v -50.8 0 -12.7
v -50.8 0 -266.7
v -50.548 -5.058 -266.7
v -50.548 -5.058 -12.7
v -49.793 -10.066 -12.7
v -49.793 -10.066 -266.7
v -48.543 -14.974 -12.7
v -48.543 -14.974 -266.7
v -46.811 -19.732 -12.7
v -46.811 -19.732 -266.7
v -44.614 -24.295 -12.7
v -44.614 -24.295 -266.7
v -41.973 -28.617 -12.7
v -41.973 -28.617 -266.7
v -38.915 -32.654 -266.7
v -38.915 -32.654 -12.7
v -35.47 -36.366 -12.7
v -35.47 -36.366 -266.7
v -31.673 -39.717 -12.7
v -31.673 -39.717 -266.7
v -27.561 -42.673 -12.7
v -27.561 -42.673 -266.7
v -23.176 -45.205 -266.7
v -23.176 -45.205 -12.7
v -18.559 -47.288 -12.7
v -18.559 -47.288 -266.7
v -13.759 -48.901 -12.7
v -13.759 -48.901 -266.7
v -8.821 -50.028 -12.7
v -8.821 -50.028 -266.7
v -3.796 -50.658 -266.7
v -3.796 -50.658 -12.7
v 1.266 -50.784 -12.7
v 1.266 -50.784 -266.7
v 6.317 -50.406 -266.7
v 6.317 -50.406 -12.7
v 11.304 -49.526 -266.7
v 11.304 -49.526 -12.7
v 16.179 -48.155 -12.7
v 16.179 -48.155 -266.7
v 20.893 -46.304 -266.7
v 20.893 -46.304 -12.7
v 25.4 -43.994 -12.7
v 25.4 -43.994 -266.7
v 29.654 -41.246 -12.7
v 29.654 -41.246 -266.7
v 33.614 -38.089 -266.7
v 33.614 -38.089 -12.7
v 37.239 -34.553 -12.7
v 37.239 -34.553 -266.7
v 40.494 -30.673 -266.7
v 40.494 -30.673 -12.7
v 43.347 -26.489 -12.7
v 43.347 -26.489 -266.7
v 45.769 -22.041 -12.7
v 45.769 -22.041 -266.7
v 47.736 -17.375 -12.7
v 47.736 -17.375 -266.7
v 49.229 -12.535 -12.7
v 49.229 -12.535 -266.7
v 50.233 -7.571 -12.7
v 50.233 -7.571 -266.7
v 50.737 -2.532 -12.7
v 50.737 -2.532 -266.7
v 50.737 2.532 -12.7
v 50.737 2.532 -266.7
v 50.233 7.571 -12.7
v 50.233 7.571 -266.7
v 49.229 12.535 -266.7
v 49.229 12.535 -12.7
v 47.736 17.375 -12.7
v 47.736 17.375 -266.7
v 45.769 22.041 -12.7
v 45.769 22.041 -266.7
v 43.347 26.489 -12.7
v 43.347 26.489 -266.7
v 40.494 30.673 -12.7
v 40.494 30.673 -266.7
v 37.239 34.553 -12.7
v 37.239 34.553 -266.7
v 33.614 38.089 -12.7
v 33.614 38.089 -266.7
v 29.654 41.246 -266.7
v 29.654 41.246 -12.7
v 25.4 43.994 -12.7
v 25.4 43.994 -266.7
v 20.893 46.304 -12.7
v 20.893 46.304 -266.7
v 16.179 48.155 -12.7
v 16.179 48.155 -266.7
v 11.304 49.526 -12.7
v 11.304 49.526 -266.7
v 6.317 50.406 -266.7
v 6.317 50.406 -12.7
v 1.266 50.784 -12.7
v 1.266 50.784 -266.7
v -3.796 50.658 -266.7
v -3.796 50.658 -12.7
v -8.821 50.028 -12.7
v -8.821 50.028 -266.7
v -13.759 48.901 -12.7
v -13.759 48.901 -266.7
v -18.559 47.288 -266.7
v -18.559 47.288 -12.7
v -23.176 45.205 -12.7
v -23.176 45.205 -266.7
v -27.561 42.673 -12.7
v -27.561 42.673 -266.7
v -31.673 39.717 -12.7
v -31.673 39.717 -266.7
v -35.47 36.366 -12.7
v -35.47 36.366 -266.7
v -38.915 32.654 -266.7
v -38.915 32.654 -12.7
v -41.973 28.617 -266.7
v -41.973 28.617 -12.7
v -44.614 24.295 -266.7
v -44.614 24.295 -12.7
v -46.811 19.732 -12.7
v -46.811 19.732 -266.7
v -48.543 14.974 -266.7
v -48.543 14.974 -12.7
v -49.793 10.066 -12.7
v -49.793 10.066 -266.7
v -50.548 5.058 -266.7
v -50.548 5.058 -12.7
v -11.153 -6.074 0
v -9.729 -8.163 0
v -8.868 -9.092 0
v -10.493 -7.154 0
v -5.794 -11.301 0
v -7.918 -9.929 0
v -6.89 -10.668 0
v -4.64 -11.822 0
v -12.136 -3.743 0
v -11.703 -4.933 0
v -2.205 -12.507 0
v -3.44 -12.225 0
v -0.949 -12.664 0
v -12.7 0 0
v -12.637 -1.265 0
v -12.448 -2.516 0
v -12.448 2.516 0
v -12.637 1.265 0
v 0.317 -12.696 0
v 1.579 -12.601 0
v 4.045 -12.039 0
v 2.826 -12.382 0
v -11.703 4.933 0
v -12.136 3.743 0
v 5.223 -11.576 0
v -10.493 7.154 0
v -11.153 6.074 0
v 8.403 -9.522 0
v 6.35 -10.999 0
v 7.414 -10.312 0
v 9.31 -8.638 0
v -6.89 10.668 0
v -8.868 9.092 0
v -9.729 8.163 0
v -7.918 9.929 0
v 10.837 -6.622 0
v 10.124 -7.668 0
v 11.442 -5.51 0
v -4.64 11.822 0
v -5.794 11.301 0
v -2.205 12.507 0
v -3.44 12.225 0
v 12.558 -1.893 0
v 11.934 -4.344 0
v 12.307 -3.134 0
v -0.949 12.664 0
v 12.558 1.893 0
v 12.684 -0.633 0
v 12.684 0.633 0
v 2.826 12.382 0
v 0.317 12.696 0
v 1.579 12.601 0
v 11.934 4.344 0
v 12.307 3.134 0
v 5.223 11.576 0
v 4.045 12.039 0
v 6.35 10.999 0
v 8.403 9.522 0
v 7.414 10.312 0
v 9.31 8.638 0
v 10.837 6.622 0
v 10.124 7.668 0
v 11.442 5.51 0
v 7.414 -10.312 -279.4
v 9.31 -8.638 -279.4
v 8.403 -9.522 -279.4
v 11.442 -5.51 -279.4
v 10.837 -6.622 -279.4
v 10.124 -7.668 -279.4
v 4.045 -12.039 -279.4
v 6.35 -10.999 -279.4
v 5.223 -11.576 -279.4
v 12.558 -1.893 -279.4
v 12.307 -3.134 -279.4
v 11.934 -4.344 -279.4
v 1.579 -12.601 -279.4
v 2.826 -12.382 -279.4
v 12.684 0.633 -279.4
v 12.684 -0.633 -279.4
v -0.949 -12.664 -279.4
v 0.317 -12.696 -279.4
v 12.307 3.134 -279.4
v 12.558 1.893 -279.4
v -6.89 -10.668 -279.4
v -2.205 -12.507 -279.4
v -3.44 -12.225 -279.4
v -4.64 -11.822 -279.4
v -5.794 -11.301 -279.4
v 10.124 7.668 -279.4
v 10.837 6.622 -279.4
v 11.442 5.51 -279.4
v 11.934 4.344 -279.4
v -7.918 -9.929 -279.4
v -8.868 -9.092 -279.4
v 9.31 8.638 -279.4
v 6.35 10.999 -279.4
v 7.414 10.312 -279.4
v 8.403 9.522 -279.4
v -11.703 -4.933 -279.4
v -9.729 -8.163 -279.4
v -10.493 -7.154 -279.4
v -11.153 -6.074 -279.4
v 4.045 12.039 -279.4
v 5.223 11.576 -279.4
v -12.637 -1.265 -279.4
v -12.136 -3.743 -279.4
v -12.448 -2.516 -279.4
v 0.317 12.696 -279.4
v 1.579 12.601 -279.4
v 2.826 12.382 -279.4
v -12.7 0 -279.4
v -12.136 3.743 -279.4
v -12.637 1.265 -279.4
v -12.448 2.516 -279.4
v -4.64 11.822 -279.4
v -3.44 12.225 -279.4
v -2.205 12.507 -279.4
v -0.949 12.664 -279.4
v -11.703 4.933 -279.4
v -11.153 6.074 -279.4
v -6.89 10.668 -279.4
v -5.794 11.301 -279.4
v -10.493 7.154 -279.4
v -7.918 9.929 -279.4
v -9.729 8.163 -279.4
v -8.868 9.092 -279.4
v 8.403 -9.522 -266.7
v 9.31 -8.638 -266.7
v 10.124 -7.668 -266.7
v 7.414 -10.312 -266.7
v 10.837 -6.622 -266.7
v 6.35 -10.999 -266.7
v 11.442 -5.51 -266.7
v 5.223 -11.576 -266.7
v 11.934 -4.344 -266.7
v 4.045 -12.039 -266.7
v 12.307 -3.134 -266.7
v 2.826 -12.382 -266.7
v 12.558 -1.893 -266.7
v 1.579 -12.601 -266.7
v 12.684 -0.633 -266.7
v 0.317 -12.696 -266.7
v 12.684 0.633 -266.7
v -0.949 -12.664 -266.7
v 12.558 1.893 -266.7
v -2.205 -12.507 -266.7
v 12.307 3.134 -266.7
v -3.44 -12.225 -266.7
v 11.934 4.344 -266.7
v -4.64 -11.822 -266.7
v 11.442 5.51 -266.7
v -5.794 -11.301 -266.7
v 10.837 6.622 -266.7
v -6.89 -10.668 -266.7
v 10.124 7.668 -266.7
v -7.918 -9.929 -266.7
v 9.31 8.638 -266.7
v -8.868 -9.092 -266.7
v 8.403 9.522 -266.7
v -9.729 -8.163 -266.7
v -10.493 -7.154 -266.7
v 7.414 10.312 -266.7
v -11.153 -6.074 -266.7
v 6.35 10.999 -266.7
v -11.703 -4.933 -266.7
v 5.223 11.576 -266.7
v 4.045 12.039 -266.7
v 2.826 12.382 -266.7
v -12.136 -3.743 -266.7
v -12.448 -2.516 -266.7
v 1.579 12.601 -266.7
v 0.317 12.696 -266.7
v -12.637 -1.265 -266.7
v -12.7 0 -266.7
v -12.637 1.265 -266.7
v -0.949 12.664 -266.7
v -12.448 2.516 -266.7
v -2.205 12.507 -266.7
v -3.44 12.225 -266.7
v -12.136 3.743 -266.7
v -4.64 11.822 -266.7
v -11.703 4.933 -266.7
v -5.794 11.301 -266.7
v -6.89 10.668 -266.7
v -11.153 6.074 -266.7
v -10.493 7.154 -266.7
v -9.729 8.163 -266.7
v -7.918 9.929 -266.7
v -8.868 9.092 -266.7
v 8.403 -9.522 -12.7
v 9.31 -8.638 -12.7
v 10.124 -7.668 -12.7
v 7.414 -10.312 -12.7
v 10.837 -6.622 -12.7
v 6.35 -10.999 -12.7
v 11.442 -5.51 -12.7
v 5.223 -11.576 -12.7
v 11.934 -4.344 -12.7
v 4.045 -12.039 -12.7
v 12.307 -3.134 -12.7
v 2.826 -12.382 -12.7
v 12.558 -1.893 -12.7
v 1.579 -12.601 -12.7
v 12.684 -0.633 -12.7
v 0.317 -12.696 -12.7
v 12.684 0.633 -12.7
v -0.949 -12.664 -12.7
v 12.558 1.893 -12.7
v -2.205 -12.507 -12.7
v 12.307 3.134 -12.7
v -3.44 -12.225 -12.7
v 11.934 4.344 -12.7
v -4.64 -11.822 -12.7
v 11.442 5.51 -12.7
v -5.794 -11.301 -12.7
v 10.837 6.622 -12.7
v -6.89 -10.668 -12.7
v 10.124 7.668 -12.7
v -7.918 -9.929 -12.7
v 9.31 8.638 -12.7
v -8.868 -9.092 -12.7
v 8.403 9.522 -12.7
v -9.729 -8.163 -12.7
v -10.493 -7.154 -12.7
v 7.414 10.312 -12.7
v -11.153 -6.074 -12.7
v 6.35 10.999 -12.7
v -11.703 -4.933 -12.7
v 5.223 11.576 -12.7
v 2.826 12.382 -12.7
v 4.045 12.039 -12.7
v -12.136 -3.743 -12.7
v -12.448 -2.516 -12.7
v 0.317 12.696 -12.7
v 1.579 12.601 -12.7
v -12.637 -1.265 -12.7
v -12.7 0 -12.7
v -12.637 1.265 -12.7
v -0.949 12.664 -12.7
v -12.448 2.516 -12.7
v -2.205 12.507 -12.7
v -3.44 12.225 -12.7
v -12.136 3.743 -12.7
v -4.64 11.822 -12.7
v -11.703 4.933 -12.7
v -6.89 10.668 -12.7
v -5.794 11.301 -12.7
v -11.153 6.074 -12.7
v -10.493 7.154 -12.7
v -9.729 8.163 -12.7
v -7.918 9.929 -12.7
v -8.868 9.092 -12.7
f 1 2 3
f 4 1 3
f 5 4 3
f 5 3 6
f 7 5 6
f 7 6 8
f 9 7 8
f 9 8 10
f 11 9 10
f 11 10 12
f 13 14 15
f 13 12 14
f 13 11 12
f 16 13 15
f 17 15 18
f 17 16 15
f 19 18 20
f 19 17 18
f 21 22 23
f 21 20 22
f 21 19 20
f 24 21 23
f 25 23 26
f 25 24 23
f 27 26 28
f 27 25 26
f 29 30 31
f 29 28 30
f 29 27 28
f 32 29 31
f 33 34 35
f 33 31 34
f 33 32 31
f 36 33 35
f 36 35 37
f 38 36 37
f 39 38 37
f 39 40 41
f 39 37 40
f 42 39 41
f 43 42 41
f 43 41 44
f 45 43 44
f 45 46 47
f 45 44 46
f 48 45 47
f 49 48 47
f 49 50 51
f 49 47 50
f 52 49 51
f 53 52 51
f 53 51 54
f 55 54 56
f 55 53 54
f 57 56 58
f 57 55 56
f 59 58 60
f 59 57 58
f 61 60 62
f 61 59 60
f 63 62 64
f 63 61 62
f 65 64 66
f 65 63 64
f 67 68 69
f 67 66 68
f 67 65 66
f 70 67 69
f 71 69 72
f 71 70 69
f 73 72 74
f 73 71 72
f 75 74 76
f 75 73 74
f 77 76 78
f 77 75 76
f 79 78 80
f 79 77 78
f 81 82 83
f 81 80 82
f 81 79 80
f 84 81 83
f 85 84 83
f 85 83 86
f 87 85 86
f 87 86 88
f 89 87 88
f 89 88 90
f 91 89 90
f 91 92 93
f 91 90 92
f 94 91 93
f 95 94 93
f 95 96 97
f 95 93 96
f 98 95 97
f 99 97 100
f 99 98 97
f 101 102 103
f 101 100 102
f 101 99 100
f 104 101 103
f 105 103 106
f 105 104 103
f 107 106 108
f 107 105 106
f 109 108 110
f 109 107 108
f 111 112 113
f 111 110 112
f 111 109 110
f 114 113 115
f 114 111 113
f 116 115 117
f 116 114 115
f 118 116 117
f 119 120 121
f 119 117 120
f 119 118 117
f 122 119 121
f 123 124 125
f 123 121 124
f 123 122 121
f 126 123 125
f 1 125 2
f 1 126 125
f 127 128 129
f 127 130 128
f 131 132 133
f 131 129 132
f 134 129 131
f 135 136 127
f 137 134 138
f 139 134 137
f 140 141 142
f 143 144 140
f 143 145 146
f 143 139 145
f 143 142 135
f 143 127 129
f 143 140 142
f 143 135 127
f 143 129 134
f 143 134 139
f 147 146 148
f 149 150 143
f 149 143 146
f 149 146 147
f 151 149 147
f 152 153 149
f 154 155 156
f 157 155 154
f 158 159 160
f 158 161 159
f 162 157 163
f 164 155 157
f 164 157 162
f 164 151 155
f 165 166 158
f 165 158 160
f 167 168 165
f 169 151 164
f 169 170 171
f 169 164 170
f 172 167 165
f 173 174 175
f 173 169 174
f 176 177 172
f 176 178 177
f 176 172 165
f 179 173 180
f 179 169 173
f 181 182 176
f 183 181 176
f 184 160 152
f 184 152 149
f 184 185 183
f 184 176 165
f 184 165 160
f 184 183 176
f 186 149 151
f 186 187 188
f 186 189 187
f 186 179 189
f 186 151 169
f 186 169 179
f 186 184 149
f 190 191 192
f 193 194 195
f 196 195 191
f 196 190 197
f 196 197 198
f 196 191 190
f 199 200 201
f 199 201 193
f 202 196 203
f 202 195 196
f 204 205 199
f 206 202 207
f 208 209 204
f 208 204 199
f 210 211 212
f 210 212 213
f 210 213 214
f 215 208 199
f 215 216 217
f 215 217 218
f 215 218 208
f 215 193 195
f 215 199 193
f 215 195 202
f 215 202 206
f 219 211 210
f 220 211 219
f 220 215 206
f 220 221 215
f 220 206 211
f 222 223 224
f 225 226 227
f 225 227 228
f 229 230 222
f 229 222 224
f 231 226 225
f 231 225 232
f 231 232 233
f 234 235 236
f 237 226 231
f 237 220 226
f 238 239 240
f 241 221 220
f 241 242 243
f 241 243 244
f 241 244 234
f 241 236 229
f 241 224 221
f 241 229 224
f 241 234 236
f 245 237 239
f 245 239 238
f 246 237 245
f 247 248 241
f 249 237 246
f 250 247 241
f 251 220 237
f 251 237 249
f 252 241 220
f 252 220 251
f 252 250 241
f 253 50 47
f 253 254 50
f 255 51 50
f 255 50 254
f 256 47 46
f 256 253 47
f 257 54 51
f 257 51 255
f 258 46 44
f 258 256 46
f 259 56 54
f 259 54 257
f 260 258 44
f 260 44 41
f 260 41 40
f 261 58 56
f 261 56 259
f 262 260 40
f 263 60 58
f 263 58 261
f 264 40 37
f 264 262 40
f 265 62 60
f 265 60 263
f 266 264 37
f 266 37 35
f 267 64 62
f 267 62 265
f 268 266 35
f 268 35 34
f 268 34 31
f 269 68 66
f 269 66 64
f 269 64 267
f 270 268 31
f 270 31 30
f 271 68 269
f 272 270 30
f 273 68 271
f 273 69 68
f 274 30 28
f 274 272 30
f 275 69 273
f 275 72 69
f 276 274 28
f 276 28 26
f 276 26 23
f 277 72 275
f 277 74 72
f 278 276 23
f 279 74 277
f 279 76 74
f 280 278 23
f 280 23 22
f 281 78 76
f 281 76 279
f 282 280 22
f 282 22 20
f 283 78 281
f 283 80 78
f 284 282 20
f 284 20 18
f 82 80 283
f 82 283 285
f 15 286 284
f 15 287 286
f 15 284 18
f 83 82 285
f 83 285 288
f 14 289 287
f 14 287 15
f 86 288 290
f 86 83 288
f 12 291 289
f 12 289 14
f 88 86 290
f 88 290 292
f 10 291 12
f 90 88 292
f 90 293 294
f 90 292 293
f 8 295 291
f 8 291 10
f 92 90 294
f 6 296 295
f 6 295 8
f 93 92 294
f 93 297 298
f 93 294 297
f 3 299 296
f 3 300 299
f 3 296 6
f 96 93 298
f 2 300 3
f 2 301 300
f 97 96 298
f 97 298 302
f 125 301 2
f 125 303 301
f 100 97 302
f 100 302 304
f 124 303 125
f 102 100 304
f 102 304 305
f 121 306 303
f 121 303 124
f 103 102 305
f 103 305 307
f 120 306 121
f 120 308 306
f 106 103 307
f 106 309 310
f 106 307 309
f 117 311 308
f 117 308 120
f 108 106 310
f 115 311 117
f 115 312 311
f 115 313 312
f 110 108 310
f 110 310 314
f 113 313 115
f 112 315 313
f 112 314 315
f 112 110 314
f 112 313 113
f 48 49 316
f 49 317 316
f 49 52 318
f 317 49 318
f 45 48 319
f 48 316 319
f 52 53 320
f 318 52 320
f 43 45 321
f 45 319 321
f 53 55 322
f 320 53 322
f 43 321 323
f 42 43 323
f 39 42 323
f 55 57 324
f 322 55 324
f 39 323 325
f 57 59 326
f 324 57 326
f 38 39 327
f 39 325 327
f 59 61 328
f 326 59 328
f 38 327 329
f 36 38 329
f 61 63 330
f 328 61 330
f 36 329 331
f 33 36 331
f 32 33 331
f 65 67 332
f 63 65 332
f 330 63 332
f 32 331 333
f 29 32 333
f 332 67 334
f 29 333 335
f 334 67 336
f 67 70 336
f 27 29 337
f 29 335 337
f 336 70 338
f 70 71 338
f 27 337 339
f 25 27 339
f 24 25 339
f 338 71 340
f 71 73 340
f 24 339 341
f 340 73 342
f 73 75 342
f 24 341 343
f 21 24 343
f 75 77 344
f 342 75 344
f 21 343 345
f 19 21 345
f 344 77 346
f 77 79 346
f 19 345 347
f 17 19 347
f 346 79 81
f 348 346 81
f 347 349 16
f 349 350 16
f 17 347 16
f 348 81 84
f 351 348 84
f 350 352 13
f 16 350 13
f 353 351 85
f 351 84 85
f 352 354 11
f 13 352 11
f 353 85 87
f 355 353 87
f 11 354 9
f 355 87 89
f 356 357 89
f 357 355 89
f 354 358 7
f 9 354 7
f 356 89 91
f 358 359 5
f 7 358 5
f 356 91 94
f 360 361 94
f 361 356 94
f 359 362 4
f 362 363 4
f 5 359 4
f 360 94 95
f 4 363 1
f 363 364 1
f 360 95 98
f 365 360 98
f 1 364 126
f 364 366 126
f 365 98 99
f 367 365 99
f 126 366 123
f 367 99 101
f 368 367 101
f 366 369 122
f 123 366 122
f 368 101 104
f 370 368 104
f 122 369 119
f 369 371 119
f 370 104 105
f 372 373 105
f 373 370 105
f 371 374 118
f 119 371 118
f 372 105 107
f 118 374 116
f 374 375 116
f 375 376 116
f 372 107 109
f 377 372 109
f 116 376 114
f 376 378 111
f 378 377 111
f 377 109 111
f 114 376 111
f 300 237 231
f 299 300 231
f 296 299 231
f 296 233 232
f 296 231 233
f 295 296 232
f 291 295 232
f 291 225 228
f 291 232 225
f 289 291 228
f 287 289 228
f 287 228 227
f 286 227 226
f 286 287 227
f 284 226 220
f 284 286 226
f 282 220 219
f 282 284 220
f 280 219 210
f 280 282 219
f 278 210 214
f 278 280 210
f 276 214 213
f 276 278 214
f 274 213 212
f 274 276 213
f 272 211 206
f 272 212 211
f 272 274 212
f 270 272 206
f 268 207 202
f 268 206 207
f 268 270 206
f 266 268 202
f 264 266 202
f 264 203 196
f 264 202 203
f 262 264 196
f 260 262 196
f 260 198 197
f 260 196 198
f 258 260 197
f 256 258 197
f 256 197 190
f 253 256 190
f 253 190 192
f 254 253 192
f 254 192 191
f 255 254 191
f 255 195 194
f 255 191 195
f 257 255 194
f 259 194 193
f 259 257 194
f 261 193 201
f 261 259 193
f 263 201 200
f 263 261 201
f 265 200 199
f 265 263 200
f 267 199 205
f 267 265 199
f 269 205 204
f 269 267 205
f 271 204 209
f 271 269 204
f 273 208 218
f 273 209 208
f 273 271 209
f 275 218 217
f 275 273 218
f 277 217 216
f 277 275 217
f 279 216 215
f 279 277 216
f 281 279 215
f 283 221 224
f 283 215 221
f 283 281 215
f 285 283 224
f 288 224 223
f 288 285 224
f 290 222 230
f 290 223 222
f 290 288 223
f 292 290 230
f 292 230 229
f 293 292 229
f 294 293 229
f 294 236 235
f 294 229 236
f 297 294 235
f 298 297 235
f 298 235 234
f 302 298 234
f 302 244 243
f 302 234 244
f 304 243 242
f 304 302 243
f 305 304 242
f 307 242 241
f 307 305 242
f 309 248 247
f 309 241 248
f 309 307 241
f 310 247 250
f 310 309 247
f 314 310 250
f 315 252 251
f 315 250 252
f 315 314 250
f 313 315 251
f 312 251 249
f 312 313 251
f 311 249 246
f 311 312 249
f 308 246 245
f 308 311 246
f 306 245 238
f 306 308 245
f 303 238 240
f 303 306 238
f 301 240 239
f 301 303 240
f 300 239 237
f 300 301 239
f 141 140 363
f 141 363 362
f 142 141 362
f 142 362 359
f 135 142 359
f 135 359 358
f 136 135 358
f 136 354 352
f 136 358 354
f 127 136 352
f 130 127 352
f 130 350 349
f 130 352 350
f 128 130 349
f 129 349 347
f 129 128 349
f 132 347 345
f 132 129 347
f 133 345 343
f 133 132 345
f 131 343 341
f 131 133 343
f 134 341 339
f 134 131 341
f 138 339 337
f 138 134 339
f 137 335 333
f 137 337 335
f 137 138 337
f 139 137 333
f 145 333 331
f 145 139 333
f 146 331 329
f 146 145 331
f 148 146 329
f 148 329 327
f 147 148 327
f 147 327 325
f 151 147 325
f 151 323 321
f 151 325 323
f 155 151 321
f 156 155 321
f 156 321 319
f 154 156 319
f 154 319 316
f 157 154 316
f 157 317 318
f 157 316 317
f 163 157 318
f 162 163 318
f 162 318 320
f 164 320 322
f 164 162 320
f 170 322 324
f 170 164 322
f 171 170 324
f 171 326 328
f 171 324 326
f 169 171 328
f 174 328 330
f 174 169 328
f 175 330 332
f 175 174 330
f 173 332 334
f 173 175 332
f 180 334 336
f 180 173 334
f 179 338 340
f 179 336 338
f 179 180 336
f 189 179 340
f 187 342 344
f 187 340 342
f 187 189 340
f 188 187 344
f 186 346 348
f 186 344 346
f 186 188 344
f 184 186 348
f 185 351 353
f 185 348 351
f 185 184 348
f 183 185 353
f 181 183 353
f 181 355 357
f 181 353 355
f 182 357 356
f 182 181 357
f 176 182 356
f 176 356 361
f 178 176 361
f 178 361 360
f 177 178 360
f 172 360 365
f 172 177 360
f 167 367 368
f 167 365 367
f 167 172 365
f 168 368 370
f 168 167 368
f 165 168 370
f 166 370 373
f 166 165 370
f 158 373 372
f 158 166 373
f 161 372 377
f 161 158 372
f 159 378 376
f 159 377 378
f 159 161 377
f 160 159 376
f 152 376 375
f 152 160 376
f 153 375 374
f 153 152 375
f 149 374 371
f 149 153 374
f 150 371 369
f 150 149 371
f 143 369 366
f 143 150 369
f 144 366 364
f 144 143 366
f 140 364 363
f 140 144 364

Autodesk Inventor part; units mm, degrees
ref_plane "YZ Plane" through (0, 0, 0) normal (1, 0, 0) x (0, 1, 0)
ref_plane "XZ Plane" through (0, 0, 0) normal (0, 1, 0) x (-1, 0, 0)
ref_plane "XY Plane" through (0, 0, 0) normal (0, 0, 1) x (1, 0, 0)
sketch "Sketch1" plane through (0, 0, 0) normal (0, 0, 1) x (1, 0, 0)
  circle A0 centre (0, 0) radius 31.75
  dimension "d0" = 63.5
extrude "Extrusion1" add sketch "Sketch1" along normal blind 82.55
sketch "Sketch2" plane through (0, 0, 82.55) normal (0, 0, 1) x (1, 0, 0)
  circle A0 centre (0, 0) radius 31.75 projected
  circle A1 centre (0, 0) radius 14.859
  dimension "d3" = 29.718
extrude "Extrusion2" add sketch "Sketch2" along normal blind 6.35 contours A1
sketch "Sketch3" plane through (0, 0, 0) normal (0, 0, -1) x (-1, 0, 0)
  circle A0 centre (0, 0) radius 31.75 projected
  circle A1 centre (0, 0) radius 12.7
  dimension "d6" = 25.4
extrude "Extrusion3" add sketch "Sketch3" along normal blind 12.7 contours A1
sketch "Sketch4" plane through (0, 0, -12.7) normal (0, 0, -1) x (-1, 0, 0)
  circle A0 centre (0, 0) radius 12.7 projected
  circle A1 centre (0, 0) radius 50.8
  dimension "d9" = 101.6
extrude "Extrusion4" add sketch "Sketch4" along normal blind 254 contours A0 | A1
sketch "Sketch5" plane through (0, 0, -266.7) normal (0, 0, -1) x (-1, 0, 0)
  circle A0 centre (0, 0) radius 50.8 projected
  circle A1 centre (0, 0) radius 12.7
  dimension "d12" = 25.4
extrude "Extrusion5" add sketch "Sketch5" along normal blind 12.7 contours A1
sketch "Sketch7" plane through (0, 0, 88.9) normal (0, 0, 1) x (1, 0, 0)
  circle A0 centre (0, 0) radius 14.859 projected
  circle A1 centre (0, 0) radius 117.3057
extrude "Extrusion6" cut sketch "Sketch7" against normal blind 88.9 contours A0 | A1
properties part number "Shooter_RollerTop"
